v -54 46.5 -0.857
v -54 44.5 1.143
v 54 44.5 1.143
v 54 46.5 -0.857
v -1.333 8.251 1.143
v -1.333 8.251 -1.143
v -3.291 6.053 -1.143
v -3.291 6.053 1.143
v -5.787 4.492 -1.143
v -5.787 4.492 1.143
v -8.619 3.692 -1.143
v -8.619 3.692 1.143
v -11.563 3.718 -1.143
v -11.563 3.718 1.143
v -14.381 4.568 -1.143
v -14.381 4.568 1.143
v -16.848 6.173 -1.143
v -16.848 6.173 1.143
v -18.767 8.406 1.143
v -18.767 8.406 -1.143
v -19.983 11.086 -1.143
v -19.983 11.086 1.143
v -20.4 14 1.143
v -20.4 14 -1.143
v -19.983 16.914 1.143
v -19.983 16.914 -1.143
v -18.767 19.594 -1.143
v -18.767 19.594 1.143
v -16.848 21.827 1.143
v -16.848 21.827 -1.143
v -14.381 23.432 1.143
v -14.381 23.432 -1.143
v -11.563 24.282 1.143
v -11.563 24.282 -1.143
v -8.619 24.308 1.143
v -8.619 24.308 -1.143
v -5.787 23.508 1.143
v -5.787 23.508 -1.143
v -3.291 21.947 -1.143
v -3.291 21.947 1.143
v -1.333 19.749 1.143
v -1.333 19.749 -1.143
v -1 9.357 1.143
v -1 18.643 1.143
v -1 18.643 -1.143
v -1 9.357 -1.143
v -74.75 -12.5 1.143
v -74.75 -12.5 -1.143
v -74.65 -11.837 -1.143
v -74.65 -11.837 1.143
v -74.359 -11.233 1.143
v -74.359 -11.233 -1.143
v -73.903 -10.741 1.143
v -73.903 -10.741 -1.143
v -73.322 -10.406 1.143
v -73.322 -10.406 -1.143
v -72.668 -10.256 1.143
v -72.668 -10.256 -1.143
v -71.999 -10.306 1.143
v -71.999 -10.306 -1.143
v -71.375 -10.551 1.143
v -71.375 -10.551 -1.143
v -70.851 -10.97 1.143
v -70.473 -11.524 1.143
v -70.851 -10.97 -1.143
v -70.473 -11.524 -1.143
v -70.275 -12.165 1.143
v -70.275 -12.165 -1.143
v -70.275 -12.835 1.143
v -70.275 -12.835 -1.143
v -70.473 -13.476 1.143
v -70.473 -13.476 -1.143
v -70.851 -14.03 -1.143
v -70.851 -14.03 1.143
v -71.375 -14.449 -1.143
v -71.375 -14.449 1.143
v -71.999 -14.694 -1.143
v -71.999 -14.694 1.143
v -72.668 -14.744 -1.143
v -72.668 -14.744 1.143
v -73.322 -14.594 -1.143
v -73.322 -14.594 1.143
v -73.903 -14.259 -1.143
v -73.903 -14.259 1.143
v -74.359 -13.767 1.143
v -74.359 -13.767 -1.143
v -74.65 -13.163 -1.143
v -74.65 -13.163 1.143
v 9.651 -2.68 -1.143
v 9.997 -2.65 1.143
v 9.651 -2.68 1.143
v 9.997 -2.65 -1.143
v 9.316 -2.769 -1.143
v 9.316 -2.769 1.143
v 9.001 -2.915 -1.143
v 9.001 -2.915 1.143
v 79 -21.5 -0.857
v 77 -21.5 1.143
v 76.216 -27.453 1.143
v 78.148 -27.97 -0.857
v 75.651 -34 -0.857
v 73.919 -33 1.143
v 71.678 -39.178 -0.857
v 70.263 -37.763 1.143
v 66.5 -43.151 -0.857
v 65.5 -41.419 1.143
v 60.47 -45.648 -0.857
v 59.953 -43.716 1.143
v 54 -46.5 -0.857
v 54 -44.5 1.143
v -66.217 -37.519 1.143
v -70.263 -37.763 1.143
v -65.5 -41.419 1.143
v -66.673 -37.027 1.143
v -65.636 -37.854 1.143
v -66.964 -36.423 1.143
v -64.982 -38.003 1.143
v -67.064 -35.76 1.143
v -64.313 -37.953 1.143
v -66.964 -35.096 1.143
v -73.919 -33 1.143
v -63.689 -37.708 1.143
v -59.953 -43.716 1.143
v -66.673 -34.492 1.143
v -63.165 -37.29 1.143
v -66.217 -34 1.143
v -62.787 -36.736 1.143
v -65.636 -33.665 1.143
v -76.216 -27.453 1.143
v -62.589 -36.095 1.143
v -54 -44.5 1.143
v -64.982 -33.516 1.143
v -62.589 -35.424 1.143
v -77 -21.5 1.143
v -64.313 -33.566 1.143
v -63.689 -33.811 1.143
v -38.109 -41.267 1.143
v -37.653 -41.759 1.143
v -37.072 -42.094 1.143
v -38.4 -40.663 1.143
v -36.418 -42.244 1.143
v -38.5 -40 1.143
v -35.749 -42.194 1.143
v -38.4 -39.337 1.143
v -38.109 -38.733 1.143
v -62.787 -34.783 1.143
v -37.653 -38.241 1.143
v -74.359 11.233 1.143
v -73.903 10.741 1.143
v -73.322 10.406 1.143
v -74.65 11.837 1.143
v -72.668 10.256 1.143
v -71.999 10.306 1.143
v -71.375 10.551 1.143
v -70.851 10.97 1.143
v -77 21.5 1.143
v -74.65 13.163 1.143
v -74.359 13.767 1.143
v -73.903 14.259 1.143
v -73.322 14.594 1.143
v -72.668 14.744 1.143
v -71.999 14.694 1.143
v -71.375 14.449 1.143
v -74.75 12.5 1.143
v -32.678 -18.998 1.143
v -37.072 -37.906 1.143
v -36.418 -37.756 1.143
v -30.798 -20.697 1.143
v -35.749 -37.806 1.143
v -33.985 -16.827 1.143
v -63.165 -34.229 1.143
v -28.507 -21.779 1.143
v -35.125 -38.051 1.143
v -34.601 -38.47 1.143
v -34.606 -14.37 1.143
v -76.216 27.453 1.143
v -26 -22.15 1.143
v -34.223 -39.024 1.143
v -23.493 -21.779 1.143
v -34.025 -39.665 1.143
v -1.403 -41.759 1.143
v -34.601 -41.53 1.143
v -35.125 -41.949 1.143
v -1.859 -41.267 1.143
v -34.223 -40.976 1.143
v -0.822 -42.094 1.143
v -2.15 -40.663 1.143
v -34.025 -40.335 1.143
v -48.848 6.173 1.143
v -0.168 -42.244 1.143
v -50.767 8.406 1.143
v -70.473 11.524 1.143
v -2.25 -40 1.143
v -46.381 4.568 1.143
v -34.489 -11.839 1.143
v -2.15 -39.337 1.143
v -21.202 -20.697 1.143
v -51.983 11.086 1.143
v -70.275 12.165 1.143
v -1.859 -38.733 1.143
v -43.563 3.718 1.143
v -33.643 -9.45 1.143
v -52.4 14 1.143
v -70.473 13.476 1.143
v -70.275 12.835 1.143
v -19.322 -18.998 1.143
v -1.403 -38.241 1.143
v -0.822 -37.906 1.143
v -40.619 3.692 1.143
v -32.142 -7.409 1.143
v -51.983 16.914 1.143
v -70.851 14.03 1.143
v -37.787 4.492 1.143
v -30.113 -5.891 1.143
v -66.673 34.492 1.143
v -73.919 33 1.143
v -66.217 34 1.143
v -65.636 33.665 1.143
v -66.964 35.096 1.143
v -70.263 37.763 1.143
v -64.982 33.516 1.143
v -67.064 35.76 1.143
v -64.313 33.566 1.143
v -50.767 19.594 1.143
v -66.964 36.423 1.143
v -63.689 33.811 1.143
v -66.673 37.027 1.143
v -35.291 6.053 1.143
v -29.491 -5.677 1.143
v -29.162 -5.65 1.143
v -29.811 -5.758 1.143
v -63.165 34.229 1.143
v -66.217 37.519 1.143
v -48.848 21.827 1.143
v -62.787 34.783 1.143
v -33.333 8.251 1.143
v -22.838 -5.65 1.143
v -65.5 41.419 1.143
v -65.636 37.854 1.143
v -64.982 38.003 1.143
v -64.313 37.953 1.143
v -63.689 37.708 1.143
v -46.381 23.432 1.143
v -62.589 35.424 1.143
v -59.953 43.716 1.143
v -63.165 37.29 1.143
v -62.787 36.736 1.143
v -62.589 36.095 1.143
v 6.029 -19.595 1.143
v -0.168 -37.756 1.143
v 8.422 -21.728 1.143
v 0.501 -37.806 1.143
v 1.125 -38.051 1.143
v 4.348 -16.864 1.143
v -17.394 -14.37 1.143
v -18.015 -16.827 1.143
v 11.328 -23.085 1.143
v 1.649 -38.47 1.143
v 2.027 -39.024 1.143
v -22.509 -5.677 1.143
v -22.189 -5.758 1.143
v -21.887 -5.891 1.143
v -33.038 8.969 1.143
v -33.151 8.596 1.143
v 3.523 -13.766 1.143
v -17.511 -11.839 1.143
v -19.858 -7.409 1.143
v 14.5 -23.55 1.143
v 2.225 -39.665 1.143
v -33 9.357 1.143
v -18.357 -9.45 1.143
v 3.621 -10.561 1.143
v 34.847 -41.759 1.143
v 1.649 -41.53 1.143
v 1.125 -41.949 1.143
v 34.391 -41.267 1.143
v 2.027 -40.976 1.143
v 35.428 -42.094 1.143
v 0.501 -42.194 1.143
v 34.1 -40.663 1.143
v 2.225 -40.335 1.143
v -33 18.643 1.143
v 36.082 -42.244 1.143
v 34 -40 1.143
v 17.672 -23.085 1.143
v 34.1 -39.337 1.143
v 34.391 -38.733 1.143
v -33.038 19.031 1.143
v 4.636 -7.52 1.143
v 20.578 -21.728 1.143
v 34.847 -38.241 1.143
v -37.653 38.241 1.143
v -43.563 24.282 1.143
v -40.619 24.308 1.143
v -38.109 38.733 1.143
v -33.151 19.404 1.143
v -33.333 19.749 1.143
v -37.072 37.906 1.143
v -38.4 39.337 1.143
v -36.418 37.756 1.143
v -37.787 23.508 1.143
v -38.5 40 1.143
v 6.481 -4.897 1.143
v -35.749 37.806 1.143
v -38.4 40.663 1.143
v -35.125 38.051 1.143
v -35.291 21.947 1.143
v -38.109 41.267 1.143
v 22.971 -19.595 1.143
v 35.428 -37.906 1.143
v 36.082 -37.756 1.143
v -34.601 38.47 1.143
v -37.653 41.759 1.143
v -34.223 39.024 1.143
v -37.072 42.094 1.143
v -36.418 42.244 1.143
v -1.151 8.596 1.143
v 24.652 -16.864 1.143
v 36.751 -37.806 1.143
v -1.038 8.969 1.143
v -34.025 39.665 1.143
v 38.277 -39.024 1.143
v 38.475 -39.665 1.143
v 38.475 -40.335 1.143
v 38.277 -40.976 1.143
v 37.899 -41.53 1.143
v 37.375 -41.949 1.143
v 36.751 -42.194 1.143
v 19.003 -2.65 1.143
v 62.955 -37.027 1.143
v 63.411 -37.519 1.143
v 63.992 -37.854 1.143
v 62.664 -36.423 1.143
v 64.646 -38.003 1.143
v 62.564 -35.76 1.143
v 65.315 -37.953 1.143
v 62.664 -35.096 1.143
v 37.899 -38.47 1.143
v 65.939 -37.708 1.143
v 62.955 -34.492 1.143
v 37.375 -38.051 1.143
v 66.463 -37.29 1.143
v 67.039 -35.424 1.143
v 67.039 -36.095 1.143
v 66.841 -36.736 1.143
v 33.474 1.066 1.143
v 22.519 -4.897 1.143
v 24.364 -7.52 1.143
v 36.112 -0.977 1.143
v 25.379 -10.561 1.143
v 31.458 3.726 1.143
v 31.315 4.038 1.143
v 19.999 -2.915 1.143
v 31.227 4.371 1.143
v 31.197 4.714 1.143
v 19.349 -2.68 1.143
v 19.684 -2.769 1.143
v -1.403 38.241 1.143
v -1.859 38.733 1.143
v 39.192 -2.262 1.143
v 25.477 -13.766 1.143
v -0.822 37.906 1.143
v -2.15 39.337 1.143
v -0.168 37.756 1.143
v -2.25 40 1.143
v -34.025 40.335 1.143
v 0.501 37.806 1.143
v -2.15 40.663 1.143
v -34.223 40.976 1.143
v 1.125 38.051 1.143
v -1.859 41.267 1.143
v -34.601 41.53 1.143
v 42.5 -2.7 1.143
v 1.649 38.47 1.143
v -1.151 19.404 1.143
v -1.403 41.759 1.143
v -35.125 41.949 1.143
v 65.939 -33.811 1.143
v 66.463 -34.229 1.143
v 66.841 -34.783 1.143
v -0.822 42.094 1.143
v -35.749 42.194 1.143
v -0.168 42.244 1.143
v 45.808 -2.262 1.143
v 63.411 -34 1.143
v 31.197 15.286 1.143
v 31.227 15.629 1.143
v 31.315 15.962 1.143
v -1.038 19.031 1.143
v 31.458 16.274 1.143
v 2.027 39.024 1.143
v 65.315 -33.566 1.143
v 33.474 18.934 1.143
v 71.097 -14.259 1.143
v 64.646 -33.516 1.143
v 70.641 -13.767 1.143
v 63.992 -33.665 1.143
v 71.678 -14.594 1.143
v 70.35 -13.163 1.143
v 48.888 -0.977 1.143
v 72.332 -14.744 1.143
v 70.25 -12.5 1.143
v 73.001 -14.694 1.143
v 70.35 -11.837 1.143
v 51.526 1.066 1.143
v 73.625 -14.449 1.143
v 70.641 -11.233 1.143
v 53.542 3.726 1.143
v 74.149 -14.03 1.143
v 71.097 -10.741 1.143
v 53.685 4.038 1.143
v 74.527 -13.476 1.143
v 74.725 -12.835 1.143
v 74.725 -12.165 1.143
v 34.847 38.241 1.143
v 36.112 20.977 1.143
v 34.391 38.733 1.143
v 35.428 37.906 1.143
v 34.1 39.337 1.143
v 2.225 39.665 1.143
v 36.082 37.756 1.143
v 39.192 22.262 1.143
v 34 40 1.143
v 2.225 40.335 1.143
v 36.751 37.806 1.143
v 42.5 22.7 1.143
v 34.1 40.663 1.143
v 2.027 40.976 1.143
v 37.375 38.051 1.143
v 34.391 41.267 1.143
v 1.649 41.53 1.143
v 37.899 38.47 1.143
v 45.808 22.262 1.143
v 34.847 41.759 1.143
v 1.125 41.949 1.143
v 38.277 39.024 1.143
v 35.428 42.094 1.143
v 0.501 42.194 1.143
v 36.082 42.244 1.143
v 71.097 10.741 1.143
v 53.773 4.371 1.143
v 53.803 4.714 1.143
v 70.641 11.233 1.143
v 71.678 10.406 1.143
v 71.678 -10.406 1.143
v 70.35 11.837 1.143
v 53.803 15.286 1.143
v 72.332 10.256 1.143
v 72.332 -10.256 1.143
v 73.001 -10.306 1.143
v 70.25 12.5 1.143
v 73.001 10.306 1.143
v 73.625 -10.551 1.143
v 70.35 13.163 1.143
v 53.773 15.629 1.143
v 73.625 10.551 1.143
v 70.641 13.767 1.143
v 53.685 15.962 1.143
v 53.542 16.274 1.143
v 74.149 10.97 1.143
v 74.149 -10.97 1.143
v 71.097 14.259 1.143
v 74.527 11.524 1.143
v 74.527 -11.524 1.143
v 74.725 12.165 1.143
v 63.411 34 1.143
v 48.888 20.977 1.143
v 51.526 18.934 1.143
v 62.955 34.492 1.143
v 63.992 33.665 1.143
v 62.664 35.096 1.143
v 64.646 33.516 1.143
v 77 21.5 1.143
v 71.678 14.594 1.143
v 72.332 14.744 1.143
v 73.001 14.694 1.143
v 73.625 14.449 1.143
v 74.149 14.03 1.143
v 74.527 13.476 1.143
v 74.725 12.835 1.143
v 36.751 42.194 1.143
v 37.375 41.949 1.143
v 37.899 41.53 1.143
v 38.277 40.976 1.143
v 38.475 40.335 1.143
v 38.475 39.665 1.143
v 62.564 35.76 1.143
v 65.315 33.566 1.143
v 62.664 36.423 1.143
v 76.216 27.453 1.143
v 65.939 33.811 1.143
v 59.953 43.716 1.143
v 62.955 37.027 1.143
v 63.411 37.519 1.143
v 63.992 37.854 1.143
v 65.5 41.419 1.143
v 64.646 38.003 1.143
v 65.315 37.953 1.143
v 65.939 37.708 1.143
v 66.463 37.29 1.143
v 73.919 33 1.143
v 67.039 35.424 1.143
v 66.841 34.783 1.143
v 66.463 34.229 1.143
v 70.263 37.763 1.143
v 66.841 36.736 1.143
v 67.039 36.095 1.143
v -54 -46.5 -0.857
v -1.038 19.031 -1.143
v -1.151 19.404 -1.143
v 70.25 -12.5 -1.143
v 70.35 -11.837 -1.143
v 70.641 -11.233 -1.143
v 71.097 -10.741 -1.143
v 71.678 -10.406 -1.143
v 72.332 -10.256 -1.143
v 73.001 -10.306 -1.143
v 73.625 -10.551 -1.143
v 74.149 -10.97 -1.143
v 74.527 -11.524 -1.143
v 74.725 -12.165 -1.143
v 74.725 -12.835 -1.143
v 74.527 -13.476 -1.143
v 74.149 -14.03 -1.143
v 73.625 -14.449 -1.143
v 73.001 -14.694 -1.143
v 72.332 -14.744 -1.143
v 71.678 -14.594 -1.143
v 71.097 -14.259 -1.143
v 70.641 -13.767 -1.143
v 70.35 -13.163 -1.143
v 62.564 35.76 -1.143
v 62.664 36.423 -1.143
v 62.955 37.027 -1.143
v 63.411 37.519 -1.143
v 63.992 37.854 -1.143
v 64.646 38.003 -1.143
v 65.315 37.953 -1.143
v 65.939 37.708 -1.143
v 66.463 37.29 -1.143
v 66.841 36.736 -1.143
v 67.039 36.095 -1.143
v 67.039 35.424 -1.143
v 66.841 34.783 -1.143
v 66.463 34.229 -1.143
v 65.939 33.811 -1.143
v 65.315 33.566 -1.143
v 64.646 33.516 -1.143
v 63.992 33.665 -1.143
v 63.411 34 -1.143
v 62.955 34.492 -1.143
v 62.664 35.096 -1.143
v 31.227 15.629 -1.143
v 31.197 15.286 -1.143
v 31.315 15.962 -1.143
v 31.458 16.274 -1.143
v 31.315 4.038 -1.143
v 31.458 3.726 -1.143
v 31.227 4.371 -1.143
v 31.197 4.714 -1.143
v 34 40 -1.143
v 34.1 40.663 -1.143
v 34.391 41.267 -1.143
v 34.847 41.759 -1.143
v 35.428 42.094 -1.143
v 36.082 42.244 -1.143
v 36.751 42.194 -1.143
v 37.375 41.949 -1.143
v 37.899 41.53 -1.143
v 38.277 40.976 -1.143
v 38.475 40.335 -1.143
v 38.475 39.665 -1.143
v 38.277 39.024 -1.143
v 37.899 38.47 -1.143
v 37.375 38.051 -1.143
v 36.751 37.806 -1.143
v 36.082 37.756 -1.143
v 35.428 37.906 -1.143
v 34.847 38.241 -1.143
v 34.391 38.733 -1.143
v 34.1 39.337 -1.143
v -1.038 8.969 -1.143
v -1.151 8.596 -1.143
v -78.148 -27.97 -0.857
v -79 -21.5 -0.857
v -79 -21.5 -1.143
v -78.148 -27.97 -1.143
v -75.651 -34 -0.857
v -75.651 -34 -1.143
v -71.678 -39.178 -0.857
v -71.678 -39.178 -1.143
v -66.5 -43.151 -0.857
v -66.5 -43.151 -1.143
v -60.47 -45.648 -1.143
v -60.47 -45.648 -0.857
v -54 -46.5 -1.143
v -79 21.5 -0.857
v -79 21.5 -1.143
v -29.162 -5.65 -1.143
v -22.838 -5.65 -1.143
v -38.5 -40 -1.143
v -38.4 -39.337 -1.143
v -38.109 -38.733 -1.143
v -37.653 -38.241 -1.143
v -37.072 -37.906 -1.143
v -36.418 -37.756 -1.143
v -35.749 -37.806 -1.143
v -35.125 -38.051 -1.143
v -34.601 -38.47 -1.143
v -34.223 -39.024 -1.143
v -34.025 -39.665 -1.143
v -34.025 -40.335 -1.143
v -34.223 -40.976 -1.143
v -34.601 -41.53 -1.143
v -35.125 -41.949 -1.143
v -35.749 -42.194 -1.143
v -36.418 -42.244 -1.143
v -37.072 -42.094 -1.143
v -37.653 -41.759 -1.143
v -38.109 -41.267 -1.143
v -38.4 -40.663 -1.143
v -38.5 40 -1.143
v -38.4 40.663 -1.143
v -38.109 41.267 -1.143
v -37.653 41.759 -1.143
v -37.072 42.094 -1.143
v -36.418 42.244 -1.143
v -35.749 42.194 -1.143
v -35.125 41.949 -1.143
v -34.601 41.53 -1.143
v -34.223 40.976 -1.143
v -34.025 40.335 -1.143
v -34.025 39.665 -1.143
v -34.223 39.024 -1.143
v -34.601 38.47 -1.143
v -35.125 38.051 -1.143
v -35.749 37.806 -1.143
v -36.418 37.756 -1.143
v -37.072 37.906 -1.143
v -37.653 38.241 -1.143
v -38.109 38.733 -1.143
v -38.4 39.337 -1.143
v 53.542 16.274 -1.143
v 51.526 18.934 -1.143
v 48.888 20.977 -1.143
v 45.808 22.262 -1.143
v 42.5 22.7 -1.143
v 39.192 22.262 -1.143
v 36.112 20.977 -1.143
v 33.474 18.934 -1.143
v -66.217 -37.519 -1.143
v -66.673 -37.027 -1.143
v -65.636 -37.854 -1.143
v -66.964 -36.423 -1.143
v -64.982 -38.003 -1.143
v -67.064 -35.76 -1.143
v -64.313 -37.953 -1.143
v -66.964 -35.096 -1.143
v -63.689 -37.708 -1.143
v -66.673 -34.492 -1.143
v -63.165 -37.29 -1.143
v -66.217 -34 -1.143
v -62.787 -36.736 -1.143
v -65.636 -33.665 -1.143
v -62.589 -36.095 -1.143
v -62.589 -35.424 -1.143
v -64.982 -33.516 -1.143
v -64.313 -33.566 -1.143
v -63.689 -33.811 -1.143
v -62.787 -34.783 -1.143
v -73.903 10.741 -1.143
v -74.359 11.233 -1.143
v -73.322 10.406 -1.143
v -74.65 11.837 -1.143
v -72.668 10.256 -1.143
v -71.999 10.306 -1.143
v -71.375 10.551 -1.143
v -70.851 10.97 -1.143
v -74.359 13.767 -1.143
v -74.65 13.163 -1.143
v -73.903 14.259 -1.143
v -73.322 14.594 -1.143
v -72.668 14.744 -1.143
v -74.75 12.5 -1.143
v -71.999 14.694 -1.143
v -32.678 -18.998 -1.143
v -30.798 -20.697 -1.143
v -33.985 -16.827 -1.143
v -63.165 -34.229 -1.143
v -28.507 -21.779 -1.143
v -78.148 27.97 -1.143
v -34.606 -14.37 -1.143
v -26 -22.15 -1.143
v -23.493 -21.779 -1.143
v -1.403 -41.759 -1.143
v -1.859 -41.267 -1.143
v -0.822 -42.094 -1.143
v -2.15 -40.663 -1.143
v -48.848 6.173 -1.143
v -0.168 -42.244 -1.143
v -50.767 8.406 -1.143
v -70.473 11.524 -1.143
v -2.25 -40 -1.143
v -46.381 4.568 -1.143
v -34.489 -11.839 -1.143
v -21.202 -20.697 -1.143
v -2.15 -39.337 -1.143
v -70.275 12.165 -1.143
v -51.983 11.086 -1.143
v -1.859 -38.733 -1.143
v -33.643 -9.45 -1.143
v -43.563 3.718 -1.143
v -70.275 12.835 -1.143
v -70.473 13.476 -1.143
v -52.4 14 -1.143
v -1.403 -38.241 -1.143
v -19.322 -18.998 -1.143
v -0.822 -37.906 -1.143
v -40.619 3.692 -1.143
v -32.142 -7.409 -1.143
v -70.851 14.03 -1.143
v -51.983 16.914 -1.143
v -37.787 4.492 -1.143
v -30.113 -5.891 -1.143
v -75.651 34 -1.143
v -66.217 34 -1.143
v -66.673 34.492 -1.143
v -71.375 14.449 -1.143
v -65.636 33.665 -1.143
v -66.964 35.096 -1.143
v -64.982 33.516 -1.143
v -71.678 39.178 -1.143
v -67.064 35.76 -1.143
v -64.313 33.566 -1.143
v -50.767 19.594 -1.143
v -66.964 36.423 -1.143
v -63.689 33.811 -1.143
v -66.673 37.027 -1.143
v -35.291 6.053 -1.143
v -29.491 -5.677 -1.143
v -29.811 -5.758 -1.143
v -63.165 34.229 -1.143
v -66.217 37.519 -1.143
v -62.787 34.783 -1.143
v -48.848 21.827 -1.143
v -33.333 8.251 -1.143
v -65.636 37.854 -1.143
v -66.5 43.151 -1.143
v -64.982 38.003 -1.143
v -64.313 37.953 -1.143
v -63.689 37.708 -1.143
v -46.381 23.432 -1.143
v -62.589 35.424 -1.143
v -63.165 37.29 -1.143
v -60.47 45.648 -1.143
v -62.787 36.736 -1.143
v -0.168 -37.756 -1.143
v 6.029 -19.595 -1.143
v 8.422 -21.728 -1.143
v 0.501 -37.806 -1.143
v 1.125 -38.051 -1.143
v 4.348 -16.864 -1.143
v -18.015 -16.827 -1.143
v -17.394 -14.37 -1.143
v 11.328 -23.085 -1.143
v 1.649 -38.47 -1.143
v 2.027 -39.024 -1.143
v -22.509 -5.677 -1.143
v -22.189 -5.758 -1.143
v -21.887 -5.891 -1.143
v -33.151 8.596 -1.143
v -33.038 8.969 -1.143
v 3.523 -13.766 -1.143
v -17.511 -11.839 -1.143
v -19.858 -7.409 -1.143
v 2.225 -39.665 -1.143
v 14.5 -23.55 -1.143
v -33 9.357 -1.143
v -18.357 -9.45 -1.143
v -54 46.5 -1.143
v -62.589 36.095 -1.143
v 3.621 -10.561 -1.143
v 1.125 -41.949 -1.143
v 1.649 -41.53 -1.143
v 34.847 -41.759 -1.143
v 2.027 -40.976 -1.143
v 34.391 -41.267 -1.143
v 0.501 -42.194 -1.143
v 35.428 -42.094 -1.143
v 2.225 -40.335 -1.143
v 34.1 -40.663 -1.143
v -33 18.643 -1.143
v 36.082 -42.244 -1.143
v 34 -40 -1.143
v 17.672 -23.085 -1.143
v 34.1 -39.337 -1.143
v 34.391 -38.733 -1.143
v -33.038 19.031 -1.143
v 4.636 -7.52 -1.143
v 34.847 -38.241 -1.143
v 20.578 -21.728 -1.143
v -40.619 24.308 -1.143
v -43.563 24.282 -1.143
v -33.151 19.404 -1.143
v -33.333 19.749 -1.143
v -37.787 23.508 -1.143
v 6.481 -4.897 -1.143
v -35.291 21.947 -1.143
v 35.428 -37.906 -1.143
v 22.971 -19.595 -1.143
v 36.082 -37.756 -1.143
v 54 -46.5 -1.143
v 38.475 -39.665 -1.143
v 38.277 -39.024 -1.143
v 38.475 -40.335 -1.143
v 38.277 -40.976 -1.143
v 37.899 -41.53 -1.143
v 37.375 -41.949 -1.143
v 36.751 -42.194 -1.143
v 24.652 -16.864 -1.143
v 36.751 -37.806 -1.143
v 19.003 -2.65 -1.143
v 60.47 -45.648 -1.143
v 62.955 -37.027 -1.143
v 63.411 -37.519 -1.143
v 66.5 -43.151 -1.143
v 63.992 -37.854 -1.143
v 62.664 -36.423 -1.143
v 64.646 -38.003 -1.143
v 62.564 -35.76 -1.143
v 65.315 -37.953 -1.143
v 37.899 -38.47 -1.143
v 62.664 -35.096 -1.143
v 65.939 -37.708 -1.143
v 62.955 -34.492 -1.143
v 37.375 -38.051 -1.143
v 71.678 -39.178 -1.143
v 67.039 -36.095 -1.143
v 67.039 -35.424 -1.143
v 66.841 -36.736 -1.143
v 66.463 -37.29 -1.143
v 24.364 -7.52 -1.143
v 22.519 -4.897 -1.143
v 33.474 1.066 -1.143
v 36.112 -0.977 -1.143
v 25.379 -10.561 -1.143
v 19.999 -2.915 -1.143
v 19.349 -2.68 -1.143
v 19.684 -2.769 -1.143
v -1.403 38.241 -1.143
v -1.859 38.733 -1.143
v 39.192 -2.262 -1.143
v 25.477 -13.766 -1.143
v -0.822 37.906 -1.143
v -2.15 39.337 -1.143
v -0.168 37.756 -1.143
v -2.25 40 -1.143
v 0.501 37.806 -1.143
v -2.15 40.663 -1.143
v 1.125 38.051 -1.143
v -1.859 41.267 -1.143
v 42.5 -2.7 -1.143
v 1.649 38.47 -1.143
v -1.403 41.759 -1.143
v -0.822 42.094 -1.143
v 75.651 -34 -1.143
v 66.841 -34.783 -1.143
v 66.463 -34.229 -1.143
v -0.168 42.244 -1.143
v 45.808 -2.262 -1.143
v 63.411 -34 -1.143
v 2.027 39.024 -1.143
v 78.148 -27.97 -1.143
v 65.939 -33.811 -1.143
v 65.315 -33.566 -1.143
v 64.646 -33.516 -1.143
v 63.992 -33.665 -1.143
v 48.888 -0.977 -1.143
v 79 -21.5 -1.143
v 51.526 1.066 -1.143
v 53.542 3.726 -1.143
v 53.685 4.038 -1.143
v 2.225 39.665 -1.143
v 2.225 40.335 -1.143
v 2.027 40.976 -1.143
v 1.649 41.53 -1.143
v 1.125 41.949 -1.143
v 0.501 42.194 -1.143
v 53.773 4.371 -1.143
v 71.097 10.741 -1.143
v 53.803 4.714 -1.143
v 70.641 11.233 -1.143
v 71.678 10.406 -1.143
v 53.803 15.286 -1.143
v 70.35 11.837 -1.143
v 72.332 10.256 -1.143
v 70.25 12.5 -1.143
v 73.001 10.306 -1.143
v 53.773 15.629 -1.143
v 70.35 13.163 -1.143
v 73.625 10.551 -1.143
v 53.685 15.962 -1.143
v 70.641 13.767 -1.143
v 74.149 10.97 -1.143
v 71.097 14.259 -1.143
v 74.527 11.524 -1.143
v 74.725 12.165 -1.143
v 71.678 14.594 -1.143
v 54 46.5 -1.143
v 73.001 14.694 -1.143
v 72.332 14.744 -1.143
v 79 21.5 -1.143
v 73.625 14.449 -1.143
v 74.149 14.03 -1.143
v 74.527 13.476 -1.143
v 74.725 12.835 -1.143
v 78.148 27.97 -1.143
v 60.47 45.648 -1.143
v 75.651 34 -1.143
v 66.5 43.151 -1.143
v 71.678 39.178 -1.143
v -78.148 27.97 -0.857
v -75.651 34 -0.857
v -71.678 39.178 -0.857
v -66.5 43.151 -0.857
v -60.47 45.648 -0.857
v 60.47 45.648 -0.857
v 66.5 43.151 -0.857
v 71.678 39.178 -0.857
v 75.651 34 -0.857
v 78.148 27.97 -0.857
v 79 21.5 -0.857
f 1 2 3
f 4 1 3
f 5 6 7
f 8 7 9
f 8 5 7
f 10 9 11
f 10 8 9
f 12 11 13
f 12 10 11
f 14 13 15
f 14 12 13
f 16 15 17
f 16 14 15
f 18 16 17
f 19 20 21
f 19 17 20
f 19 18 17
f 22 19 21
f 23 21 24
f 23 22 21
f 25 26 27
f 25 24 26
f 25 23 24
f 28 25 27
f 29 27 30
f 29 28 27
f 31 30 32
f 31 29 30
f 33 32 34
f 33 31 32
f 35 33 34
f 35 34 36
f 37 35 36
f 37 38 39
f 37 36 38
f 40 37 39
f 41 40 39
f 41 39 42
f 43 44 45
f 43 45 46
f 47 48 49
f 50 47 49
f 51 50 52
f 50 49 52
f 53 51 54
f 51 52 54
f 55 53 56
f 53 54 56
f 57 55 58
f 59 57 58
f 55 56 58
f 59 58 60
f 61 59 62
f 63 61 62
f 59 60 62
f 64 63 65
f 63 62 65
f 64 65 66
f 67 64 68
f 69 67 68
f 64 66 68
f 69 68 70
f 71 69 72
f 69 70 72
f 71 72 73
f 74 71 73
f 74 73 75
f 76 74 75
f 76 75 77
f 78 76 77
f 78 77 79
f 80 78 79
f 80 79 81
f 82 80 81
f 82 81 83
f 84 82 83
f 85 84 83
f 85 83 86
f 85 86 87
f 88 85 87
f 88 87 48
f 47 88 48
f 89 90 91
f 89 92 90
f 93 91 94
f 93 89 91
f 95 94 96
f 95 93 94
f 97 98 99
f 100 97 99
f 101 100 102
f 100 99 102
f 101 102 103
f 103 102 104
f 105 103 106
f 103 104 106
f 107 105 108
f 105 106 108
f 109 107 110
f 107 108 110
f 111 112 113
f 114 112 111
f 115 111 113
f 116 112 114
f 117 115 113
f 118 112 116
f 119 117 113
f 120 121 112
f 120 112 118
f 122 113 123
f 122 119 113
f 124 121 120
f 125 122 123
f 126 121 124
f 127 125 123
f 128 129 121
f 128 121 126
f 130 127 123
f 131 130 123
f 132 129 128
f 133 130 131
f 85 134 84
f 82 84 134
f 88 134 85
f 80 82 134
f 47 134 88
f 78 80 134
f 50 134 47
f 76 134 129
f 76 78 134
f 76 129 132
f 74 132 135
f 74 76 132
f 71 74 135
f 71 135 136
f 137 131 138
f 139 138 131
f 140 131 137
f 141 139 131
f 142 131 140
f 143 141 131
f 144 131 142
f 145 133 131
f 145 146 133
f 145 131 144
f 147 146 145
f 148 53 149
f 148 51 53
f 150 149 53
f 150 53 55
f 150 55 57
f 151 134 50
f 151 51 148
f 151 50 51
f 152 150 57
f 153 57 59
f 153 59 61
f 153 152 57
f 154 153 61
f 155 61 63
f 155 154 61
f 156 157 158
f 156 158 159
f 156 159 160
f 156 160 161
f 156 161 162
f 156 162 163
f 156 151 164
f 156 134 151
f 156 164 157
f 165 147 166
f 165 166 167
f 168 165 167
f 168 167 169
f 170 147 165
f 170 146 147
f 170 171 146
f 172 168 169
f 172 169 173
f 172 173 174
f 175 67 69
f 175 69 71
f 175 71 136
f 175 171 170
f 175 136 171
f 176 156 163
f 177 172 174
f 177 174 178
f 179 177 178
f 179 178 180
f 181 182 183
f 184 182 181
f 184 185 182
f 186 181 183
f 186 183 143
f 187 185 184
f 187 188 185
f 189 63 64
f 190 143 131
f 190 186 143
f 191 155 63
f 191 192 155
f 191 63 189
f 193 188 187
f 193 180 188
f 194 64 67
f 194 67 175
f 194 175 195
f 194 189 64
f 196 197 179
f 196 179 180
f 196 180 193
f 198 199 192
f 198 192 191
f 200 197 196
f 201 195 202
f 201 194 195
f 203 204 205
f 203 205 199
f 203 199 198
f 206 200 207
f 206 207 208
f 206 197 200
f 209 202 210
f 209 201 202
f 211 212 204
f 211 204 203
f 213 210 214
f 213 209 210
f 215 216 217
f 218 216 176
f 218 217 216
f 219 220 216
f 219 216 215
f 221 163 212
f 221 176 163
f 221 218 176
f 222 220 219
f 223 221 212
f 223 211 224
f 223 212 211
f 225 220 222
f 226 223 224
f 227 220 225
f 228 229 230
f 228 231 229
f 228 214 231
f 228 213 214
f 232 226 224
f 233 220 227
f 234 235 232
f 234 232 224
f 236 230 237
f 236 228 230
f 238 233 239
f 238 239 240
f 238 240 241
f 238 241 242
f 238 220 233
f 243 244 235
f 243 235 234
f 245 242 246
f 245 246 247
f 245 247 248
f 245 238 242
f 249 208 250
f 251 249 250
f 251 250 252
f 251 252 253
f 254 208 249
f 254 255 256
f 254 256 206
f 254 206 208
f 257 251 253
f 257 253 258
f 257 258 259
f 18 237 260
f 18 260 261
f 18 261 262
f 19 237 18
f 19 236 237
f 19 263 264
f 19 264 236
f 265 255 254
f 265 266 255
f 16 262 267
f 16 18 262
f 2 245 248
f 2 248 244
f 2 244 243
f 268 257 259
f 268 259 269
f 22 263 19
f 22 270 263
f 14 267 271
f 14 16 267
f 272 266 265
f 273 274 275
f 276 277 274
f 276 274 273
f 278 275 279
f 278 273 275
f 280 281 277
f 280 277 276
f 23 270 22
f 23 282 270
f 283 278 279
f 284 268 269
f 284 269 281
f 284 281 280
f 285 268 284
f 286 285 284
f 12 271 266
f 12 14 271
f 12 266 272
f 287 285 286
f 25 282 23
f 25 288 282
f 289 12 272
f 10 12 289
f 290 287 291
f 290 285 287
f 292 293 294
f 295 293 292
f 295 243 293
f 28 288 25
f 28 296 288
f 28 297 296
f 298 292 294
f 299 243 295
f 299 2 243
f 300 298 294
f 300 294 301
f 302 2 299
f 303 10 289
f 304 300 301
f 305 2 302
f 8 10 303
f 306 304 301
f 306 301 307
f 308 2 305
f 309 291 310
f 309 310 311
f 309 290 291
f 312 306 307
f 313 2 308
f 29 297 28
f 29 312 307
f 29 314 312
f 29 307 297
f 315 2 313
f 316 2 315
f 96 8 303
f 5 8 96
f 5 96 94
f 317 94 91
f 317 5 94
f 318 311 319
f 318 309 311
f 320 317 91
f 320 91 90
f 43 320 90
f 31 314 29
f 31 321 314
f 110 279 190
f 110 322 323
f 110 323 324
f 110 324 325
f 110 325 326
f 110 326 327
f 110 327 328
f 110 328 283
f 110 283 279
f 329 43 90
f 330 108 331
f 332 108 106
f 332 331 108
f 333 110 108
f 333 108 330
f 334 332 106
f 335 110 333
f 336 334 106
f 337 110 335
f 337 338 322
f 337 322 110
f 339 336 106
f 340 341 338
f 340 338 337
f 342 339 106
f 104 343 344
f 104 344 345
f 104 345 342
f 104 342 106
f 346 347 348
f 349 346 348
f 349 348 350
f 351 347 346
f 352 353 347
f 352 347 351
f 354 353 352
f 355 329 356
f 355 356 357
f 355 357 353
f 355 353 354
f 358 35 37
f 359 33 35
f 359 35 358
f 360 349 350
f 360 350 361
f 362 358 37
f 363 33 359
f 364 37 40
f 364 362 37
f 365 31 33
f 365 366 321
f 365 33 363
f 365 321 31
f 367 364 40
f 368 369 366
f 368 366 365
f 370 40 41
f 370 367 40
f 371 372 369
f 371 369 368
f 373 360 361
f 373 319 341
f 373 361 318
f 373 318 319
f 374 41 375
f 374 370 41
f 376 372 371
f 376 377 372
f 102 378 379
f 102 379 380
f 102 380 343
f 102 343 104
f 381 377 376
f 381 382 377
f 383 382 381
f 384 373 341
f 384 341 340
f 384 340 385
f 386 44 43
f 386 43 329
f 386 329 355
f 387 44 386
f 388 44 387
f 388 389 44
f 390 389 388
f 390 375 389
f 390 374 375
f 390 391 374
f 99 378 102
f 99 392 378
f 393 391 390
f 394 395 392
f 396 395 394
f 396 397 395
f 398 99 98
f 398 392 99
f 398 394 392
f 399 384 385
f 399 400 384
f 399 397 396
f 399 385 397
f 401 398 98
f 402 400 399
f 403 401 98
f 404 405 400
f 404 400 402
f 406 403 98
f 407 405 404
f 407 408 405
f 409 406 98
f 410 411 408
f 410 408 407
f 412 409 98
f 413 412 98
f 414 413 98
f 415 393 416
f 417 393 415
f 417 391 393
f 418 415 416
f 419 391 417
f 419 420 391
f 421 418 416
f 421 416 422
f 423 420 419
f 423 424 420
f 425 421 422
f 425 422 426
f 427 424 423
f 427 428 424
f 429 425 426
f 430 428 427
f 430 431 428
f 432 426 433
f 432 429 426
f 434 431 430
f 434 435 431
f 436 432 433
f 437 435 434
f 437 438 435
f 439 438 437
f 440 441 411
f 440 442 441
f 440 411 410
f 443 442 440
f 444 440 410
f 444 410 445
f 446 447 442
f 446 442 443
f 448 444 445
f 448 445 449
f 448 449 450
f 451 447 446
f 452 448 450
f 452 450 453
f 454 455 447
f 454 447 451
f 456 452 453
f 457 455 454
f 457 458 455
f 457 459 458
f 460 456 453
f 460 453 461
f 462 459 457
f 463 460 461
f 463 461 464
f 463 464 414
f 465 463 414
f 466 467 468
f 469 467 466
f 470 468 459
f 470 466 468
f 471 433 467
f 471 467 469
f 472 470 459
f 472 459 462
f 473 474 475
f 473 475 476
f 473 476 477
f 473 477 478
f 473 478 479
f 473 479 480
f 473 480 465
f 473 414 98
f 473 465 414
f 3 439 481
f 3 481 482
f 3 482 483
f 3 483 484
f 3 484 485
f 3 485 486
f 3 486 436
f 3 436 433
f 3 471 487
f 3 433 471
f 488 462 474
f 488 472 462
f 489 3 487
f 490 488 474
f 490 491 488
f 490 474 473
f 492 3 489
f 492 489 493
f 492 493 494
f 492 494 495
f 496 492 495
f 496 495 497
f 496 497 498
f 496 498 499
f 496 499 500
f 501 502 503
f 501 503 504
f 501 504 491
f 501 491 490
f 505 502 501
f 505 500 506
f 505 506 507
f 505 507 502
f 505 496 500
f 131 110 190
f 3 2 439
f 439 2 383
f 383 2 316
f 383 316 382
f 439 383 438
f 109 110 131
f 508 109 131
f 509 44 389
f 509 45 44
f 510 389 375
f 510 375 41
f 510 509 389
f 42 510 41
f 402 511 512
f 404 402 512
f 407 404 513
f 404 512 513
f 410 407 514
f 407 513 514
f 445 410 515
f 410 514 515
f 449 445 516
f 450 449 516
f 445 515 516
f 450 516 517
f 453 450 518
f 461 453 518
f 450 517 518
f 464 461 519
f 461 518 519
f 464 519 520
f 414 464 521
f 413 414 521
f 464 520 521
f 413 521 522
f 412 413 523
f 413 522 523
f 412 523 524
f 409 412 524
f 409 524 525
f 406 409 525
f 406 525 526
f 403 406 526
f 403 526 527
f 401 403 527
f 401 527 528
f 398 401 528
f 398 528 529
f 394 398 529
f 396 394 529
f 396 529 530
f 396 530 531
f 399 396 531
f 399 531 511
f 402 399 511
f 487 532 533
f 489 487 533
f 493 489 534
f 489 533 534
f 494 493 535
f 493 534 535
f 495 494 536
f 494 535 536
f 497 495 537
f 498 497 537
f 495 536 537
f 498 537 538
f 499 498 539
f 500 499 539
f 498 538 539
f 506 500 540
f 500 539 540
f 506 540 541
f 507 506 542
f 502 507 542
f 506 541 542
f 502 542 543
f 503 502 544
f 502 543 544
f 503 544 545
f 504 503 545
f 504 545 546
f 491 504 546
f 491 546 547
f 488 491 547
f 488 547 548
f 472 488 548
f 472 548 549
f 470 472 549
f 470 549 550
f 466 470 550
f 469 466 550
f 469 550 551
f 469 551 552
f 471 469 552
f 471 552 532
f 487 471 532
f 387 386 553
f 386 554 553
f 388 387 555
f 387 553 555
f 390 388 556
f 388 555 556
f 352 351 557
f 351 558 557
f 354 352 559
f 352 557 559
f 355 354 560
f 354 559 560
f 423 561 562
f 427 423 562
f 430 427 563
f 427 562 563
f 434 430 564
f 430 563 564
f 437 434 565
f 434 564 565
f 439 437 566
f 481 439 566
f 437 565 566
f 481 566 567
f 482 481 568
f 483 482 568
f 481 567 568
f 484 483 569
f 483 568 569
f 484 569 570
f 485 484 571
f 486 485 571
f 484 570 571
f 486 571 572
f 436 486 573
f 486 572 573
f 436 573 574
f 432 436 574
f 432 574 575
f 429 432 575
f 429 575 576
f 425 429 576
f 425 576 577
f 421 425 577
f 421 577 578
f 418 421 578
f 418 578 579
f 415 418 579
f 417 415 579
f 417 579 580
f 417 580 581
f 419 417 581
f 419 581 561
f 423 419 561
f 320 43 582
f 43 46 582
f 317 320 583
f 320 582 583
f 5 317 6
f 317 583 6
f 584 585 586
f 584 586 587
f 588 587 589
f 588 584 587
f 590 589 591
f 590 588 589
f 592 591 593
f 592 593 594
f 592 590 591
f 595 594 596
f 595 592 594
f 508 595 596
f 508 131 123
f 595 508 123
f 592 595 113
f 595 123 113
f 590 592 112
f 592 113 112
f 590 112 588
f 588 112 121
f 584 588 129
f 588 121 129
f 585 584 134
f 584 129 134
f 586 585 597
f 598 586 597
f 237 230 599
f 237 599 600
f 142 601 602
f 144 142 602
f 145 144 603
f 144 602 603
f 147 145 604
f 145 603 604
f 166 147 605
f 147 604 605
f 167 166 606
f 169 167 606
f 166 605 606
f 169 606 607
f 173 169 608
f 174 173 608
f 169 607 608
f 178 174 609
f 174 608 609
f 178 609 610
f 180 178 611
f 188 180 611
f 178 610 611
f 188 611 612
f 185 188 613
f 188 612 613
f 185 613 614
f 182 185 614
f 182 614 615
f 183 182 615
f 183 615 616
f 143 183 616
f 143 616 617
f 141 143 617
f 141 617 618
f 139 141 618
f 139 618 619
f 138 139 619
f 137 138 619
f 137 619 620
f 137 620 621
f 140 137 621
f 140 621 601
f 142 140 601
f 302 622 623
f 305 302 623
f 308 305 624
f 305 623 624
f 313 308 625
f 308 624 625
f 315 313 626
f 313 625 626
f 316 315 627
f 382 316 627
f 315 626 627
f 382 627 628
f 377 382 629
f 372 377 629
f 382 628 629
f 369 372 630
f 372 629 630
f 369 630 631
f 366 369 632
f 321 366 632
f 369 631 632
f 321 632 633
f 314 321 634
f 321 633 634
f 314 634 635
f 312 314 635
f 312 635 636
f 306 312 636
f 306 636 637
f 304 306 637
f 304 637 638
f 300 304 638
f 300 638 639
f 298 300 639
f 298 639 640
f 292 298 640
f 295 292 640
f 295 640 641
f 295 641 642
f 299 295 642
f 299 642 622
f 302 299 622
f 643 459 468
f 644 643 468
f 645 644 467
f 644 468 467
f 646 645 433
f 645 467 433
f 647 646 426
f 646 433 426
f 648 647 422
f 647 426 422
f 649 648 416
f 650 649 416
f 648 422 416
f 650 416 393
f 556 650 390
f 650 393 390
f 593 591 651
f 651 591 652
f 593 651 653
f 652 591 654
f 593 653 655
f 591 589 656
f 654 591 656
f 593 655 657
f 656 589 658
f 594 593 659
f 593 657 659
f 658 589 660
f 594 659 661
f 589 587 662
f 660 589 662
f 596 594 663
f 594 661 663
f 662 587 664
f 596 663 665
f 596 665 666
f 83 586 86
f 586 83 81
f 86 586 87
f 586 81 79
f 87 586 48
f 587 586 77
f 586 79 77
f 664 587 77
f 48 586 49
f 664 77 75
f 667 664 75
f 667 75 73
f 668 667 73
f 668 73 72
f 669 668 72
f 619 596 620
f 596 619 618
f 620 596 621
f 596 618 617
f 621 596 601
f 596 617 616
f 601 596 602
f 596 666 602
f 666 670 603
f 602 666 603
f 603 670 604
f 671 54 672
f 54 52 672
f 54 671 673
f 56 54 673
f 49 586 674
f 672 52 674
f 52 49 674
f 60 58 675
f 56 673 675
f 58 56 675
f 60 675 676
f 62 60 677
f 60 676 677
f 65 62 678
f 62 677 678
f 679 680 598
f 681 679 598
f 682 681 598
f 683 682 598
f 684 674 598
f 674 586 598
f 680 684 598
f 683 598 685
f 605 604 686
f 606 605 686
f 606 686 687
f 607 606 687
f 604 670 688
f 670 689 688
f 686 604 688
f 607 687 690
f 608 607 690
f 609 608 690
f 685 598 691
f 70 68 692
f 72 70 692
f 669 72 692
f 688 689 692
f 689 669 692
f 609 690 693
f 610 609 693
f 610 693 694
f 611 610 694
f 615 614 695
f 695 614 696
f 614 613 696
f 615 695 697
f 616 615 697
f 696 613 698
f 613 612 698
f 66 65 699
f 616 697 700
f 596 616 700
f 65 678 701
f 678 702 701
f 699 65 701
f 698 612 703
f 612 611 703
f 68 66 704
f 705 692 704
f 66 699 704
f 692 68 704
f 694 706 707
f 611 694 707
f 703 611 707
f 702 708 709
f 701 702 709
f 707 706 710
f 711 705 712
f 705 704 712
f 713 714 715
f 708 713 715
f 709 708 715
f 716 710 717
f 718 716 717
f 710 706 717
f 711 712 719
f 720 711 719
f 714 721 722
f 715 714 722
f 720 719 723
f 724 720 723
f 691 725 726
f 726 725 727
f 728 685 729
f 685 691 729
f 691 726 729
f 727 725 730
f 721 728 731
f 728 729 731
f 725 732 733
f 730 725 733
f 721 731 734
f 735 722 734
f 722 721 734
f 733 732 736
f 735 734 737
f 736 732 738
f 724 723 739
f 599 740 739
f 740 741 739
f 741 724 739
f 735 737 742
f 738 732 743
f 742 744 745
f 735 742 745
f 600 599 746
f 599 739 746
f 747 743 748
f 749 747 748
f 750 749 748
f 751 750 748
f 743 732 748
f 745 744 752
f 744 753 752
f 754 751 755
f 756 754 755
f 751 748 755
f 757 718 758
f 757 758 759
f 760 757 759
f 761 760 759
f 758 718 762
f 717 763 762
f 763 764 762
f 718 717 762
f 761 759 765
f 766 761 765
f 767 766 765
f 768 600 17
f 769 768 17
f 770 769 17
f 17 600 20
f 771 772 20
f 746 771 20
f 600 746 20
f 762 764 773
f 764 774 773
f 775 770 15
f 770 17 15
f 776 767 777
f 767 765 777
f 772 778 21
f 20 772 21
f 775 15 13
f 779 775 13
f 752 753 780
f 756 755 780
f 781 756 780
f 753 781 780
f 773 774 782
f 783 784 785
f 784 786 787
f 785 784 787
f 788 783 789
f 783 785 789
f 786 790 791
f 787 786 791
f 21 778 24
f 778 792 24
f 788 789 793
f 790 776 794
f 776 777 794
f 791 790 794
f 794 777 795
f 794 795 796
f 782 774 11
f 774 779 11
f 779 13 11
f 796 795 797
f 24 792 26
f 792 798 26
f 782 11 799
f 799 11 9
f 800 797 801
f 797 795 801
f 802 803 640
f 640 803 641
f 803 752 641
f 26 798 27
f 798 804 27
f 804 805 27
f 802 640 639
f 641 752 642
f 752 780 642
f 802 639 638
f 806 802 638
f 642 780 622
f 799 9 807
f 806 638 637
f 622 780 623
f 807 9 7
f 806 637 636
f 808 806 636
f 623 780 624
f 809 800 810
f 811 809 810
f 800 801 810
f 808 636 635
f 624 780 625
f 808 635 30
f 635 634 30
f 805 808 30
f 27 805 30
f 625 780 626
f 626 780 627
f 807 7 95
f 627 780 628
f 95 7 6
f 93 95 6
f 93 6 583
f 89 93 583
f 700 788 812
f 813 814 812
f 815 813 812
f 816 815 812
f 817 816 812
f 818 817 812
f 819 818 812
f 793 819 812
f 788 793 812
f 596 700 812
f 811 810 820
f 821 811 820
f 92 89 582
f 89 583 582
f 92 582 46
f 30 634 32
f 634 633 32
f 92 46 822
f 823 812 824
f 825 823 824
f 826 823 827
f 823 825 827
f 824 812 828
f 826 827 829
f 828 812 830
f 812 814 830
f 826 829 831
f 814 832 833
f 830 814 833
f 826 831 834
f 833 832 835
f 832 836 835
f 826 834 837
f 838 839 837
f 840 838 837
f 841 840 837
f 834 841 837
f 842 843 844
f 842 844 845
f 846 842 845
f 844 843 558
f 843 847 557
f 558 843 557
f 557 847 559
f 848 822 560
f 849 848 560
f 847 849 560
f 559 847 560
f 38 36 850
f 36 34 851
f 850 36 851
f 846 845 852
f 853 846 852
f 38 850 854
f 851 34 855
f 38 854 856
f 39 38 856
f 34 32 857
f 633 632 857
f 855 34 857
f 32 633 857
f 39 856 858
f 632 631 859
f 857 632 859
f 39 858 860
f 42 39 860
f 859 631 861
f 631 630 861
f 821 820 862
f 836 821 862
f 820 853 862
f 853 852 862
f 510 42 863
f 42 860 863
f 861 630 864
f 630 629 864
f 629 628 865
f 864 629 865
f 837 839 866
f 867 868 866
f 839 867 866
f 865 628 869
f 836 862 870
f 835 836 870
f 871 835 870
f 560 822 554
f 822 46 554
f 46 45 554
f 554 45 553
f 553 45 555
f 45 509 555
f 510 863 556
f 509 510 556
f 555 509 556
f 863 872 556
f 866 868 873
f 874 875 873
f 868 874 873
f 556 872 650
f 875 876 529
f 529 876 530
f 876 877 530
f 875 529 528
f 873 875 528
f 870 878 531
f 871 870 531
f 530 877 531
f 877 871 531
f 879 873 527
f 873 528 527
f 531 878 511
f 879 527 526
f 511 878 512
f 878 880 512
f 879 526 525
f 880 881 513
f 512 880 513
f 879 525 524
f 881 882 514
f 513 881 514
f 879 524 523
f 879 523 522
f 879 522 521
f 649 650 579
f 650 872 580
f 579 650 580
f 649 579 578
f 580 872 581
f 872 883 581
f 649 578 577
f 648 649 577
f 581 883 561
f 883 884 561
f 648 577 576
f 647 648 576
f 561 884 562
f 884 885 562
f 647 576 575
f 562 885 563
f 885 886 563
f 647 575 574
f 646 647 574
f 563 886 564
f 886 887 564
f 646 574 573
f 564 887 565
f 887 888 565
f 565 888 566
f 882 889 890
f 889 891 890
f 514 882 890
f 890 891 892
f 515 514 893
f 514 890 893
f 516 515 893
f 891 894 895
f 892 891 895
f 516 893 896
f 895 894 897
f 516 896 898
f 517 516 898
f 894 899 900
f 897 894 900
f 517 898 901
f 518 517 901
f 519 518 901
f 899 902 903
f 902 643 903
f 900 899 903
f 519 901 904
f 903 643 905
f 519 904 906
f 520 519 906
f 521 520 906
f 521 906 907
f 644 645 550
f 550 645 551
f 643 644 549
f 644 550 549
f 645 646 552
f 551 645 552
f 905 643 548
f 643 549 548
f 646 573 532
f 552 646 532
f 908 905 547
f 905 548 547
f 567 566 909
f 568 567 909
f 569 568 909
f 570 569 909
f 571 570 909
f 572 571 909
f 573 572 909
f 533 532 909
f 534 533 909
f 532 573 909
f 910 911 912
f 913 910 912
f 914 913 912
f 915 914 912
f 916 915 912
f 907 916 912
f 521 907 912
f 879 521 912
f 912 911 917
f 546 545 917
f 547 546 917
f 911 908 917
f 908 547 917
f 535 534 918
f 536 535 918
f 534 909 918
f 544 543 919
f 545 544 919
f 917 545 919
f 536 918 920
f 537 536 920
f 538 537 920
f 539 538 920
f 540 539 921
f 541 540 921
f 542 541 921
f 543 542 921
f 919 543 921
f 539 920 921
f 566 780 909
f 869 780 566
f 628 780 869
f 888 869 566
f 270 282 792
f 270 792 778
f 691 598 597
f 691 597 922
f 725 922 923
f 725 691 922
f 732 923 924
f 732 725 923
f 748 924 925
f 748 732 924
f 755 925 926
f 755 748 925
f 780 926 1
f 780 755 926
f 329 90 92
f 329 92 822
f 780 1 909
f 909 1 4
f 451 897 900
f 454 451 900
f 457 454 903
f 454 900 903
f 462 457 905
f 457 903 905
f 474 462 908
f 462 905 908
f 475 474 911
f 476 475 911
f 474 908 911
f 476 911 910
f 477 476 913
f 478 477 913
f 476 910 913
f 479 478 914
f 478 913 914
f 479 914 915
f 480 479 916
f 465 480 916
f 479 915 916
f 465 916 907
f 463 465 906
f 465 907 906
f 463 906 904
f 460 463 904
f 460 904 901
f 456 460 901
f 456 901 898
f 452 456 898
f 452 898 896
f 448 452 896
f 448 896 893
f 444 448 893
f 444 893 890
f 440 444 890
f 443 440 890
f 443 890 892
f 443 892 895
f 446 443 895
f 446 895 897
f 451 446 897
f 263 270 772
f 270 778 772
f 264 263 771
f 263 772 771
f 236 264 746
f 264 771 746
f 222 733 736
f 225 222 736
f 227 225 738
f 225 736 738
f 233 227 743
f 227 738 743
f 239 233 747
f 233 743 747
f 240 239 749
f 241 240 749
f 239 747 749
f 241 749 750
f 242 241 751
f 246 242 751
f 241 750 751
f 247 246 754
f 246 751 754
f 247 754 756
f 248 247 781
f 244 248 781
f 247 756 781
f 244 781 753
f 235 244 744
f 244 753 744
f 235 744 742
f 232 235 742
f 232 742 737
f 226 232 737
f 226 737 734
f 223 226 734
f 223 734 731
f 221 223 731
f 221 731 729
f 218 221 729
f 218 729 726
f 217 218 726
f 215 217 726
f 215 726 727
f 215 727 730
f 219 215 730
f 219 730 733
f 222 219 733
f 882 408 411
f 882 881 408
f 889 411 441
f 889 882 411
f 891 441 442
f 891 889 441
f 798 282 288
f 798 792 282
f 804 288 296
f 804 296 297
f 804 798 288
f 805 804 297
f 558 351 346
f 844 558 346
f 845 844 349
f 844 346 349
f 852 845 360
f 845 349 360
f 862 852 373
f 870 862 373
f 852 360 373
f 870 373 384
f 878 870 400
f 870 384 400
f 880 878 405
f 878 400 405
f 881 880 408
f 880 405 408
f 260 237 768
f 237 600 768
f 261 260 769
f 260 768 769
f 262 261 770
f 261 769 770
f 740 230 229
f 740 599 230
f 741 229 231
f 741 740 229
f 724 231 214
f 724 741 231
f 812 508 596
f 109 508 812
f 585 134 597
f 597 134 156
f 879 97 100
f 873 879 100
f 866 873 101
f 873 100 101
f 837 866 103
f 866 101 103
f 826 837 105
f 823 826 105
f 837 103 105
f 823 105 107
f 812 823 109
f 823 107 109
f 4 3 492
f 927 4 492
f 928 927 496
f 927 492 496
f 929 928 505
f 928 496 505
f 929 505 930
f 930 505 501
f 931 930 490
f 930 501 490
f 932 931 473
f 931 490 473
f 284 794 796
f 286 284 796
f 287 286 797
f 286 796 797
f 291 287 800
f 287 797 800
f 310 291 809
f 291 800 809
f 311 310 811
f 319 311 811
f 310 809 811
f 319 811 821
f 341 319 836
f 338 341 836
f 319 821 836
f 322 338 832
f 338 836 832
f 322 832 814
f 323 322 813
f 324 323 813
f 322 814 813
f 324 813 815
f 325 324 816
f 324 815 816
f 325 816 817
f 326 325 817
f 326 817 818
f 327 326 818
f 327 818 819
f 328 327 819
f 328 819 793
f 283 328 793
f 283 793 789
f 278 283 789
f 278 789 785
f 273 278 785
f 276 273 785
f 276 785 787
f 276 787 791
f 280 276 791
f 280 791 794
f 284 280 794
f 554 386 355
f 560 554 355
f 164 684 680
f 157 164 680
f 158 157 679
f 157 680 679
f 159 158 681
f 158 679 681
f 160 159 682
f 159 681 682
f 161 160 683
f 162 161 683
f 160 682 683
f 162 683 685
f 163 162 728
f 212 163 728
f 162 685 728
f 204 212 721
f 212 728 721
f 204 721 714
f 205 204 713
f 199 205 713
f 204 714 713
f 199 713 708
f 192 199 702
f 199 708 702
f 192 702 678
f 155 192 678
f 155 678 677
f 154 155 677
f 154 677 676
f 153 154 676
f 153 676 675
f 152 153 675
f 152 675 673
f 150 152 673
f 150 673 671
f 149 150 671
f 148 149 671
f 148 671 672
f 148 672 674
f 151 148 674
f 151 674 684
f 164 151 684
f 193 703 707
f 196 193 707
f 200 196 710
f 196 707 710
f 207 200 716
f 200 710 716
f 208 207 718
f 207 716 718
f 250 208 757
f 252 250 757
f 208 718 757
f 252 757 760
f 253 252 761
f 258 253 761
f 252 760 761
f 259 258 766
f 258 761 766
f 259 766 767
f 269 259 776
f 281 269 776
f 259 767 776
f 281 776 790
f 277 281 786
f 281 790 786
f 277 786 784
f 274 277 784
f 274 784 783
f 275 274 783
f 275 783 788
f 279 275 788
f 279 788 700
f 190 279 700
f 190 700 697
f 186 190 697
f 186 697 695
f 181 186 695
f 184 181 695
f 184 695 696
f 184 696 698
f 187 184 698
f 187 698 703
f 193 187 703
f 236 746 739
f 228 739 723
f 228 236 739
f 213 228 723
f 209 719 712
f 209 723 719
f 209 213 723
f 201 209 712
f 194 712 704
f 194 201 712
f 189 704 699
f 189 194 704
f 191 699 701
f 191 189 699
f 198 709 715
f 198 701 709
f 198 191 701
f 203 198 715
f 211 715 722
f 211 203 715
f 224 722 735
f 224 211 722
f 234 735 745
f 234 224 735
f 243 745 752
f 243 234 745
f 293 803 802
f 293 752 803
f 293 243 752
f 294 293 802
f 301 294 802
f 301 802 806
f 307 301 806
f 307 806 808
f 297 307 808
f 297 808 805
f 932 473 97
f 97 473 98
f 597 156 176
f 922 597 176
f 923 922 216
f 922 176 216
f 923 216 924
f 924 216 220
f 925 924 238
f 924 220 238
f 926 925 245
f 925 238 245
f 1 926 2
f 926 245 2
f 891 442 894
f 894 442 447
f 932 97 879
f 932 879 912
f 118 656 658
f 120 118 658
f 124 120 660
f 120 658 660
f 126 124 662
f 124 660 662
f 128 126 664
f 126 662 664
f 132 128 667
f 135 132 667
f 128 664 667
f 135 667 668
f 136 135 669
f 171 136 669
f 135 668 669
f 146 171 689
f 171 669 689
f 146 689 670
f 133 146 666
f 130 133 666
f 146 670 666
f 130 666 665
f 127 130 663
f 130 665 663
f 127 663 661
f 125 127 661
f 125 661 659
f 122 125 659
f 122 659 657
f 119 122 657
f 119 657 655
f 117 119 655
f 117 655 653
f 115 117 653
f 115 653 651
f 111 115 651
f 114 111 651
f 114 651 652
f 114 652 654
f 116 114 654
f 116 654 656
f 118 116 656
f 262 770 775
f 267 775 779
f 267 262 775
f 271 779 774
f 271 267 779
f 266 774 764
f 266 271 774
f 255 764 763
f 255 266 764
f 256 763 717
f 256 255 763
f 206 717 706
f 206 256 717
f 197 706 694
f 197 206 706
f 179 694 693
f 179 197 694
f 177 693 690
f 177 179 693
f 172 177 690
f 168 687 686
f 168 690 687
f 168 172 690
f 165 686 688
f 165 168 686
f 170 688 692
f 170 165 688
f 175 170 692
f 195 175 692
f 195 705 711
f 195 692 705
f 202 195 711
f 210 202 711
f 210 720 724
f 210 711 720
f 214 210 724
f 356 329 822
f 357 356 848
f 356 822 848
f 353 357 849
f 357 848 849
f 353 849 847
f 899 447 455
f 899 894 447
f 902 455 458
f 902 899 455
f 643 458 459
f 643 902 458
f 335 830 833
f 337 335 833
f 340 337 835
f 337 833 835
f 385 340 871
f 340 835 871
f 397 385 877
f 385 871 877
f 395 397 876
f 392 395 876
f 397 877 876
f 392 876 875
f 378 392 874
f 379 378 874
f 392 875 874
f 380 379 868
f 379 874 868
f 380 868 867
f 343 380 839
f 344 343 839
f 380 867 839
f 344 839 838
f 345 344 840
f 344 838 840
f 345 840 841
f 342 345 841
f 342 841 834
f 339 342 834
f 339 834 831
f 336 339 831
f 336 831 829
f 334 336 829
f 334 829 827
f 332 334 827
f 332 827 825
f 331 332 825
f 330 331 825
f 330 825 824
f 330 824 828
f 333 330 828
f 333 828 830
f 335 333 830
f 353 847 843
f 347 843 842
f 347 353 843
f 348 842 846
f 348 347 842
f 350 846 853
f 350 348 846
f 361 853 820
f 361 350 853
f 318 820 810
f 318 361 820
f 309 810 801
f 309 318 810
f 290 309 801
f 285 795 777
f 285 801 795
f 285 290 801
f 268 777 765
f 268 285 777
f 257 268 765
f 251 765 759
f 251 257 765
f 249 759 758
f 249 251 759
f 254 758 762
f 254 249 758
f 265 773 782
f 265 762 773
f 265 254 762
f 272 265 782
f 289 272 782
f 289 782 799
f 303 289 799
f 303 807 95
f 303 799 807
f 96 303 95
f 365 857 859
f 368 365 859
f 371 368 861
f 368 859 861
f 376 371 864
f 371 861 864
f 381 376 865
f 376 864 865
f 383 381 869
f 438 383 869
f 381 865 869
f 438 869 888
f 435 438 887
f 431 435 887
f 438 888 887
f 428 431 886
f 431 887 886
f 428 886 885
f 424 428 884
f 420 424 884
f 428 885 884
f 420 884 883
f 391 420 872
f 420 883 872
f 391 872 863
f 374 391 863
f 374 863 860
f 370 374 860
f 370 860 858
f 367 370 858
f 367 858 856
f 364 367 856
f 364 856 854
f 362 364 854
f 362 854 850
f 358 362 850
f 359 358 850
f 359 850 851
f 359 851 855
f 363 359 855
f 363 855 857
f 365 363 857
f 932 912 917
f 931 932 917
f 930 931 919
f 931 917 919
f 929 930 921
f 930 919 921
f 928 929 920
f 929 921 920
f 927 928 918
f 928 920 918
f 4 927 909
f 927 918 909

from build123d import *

# Parameters (mm, degrees)
SKETCH1_W            = 158
SKETCH1_H            = 93
BOSS_EXTRUDE1_DEPTH  = 1.143
FILLET1_R            = 25
M4_CLEARANCE_HOLE1_D = 4.5
CHAMFER2_SIZE        = 2
CUT_EXTRUDE1_REACH   = 93.698
FILLET2_R            = 2


with BuildPart() as part:
    # Sketch1 → Boss-Extrude1 (new, symmetric)
    with BuildSketch(Plane.XY):
        Rectangle(SKETCH1_W, SKETCH1_H)
    extrude(amount=BOSS_EXTRUDE1_DEPTH, both=True)

    # Fillet1
    fillet1_edges = [part.edges().sort_by_distance(p)[0] for p in [
        (-79, 46.5, 0),
        (79, 46.5, 0),
        (79, -46.5, 0),
        (-79, -46.5, 0),
    ]]
    fillet(fillet1_edges, radius=FILLET1_R)

    # M4 Clearance Hole1 (through all)
    with Locations(Plane.XY.offset(1.143)):
        with Locations((72.5, 12.5), (0, 40), (0, -40), (-36.25, -40), (-36.25, 40), (36.25, 40), (36.25, -40), (-64.814123615, 35.759516477), (-64.814123615, -35.759516477), (64.814123615, -35.759516477), (64.814123615, 35.759516477), (-72.5, 12.5), (-72.5, -12.5), (72.5, -12.5)):
            Hole(M4_CLEARANCE_HOLE1_D / 2)

    # Chamfer2
    chamfer2_edges = [part.edges().sort_by_distance(p)[0] for p in [
        (-79, 0, 1.143),
        (0, 46.5, 1.143),
        (0, -46.5, 1.143),
        (79, 0, 1.143),
        (71.67766953, 39.17766953, 1.143),
        (-71.67766953, -39.17766953, 1.143),
        (71.67766953, -39.17766953, 1.143),
        (-71.67766953, 39.17766953, 1.143),
    ]]
    chamfer(chamfer2_edges, length=CHAMFER2_SIZE)

    # Sketch7 → Cut-Extrude1 (cut, up to next)
    with BuildSketch(Plane.XY.offset(1.143), mode=Mode.PRIVATE) as cut_extrude1_sk1:
        with BuildLine():
            Line((-33, 19.211525688), (-33, 8.788474312))
            ThreePointArc((-33, 8.788474312), (-52.4, 14), (-33, 19.211525688))
        make_face()
    cut_extrude1_tool1 = extrude(cut_extrude1_sk1.sketch, amount=-CUT_EXTRUDE1_REACH, mode=Mode.PRIVATE) & part.part
    # Sketch7 → Cut-Extrude1 (cut, up to next)
    with BuildSketch(Plane.XY.offset(1.143), mode=Mode.PRIVATE) as cut_extrude1_sk2:
        with BuildLine():
            Line((-29.633180425, -5.65), (-22.366819575, -5.65))
            ThreePointArc((-22.366819575, -5.65), (-26, -22.15), (-29.633180425, -5.65))
        make_face()
    cut_extrude1_tool2 = extrude(cut_extrude1_sk2.sketch, amount=-CUT_EXTRUDE1_REACH, mode=Mode.PRIVATE) & part.part
    # Sketch7 → Cut-Extrude1 (cut, up to next)
    with BuildSketch(Plane.XY.offset(1.143), mode=Mode.PRIVATE) as cut_extrude1_sk3:
        with BuildLine():
            Line((-1, 19.211525688), (-1, 8.788474312))
            ThreePointArc((-1, 8.788474312), (-20.4, 14), (-1, 19.211525688))
        make_face()
    cut_extrude1_tool3 = extrude(cut_extrude1_sk3.sketch, amount=-CUT_EXTRUDE1_REACH, mode=Mode.PRIVATE) & part.part
    # Sketch7 → Cut-Extrude1 (cut, up to next)
    with BuildSketch(Plane.XY.offset(1.143), mode=Mode.PRIVATE) as cut_extrude1_sk4:
        with BuildLine():
            Line((31.197, 15.790698663), (31.197, 4.209301337))
            ThreePointArc((31.197, 4.209301337), (42.5, -2.7), (53.803, 4.209301337))
            Line((53.803, 4.209301337), (53.803, 15.790698663))
            ThreePointArc((53.803, 15.790698663), (42.5, 22.7), (31.197, 15.790698663))
        make_face()
    cut_extrude1_tool4 = extrude(cut_extrude1_sk4.sketch, amount=-CUT_EXTRUDE1_REACH, mode=Mode.PRIVATE) & part.part
    # Sketch7 → Cut-Extrude1 (cut, up to next)
    with BuildSketch(Plane.XY.offset(1.143), mode=Mode.PRIVATE) as cut_extrude1_sk5:
        with BuildLine():
            Line((9.49200639, -2.65), (19.50799361, -2.65))
            ThreePointArc((19.50799361, -2.65), (14.5, -23.55), (9.49200639, -2.65))
        make_face()
    cut_extrude1_tool5 = extrude(cut_extrude1_sk5.sketch, amount=-CUT_EXTRUDE1_REACH, mode=Mode.PRIVATE) & part.part
    add(cut_extrude1_tool1.solids().sort_by_distance((-42.286012, 14, 1.143))[0], mode=Mode.SUBTRACT)
    add(cut_extrude1_tool2.solids().sort_by_distance((-26, -13.638318, 1.143))[0], mode=Mode.SUBTRACT)
    add(cut_extrude1_tool3.solids().sort_by_distance((-10.286012, 14, 1.143))[0], mode=Mode.SUBTRACT)
    add(cut_extrude1_tool4.solids().sort_by_distance((42.5, 10, 1.143))[0], mode=Mode.SUBTRACT)
    add(cut_extrude1_tool5.solids().sort_by_distance((14.5, -12.722997, 1.143))[0], mode=Mode.SUBTRACT)

    # Fillet2
    fillet2_edges = [part.edges().sort_by_distance(p)[0] for p in [
        (31.197, 15.790698663, 0),
        (53.803, 15.790698663, 0),
        (53.803, 4.209301337, 0),
        (31.197, 4.209301337, 0),
        (19.50799361, -2.65, 0),
        (9.49200639, -2.65, 0),
        (-1, 8.788474312, 0),
        (-1, 19.211525688, 0),
        (-33, 8.788474312, 0),
        (-33, 19.211525688, 0),
        (-22.366819575, -5.65, 0),
        (-29.633180425, -5.65, 0),
    ]]
    fillet(fillet2_edges, radius=FILLET2_R)


solid = part.part
